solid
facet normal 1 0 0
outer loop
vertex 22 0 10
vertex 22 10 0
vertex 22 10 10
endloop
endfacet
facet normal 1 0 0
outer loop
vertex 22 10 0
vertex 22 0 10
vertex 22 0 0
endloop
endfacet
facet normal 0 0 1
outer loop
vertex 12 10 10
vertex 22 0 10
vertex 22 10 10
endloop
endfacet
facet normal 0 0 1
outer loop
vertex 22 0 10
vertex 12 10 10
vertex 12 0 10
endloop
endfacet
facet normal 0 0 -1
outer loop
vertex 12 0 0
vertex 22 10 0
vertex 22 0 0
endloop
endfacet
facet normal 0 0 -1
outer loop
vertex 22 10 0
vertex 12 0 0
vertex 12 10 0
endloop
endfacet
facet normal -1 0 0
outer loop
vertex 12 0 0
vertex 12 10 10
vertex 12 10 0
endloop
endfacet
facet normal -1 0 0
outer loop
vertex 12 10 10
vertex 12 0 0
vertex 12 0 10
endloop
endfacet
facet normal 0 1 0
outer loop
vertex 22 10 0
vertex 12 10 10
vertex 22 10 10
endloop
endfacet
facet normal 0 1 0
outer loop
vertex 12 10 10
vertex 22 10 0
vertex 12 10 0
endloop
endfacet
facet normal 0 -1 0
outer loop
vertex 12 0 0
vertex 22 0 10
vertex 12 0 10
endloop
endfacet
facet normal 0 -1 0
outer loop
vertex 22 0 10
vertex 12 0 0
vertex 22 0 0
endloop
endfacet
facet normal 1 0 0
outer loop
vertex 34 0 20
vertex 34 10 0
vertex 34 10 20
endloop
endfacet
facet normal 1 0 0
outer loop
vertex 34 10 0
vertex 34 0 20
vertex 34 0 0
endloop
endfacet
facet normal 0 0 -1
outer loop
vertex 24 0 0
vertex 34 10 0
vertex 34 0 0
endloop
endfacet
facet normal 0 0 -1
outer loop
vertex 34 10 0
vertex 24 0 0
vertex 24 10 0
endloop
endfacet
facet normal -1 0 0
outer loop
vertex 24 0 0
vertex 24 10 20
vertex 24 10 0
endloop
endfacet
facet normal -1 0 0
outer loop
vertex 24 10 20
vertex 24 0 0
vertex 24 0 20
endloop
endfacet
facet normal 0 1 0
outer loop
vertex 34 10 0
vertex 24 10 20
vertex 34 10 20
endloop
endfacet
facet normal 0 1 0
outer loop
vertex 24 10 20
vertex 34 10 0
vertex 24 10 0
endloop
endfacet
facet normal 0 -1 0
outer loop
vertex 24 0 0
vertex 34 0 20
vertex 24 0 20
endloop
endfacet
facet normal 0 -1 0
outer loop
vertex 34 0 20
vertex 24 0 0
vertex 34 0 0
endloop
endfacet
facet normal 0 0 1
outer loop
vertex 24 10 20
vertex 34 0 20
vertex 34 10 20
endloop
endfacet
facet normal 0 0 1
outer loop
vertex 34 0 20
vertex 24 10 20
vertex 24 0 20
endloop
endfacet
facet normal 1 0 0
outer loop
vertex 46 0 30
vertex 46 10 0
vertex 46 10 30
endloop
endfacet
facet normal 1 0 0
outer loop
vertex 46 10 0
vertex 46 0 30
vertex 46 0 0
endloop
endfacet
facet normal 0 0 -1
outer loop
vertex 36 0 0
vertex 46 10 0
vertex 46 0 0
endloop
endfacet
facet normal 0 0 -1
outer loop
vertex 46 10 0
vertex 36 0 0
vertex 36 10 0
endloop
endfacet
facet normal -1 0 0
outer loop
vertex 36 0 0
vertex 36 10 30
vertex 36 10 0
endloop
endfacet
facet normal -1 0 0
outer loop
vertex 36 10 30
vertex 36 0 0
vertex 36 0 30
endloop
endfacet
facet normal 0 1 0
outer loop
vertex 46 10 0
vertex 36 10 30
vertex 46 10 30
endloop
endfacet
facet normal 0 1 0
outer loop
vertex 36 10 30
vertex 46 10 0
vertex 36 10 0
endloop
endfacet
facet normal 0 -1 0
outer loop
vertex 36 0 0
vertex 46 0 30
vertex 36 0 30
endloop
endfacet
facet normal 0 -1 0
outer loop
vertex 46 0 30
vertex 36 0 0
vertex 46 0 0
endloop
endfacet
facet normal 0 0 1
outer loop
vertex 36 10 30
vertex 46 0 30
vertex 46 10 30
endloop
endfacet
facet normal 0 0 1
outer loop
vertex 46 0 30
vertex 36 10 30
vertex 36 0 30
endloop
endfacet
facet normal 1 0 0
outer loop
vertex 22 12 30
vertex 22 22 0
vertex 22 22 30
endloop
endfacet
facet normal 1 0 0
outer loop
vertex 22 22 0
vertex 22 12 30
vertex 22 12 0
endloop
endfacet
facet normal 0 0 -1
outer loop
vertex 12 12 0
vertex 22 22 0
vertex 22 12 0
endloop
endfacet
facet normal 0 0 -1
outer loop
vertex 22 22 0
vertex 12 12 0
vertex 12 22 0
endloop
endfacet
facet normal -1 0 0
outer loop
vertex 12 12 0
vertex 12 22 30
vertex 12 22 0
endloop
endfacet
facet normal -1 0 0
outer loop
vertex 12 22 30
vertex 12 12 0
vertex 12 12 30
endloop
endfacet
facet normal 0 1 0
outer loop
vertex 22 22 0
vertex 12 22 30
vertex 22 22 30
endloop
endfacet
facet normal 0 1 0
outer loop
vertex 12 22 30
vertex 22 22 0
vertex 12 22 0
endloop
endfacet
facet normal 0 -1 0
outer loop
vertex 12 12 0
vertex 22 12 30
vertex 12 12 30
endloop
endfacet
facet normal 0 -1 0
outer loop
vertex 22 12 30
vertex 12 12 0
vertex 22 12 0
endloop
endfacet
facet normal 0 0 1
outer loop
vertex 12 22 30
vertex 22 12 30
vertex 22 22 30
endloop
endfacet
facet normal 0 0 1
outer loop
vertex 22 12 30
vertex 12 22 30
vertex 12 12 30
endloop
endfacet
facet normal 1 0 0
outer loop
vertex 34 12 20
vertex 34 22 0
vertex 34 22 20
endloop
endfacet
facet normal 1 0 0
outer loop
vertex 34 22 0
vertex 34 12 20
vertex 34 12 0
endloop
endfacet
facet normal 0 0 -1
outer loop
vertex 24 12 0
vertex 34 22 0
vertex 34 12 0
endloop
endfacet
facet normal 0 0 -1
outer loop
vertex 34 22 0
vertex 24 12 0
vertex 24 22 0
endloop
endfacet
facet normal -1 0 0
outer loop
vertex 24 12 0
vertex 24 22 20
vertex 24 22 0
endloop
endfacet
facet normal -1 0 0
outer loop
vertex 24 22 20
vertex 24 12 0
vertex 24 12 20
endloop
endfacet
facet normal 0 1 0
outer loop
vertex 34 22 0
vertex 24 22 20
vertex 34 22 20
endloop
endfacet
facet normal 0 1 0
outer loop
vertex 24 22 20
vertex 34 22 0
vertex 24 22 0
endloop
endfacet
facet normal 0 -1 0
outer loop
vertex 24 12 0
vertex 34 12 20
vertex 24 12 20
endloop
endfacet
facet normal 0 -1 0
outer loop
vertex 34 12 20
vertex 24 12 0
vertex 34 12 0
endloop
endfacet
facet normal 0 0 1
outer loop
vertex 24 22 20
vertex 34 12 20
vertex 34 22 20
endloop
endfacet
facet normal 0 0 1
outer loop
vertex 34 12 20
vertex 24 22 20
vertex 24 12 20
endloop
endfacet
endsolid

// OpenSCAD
// Generated by gitshelves
// 2024-01 (0 contributions) reserved at [0, 0]
translate([12, 0, 0]) cube(10); // 2024-02
translate([24, 0, 0]) cube(10); // 2024-03
translate([24, 0, 10]) cube(10); // 2024-03
translate([36, 0, 0]) cube(10); // 2024-04
translate([36, 0, 10]) cube(10); // 2024-04
translate([36, 0, 20]) cube(10); // 2024-04
// 2024-05 (0 contributions) reserved at [0, 12]
translate([12, 12, 0]) cube(10); // 2024-06
translate([12, 12, 10]) cube(10); // 2024-06
translate([12, 12, 20]) cube(10); // 2024-06
translate([24, 12, 0]) cube(10); // 2024-07
translate([24, 12, 10]) cube(10); // 2024-07
// 2024-08 (0 contributions) reserved at [36, 12]
// 2024-09 (0 contributions) reserved at [0, 24]
// 2024-10 (0 contributions) reserved at [12, 24]
// 2024-11 (0 contributions) reserved at [24, 24]
// 2024-12 (0 contributions) reserved at [36, 24]
